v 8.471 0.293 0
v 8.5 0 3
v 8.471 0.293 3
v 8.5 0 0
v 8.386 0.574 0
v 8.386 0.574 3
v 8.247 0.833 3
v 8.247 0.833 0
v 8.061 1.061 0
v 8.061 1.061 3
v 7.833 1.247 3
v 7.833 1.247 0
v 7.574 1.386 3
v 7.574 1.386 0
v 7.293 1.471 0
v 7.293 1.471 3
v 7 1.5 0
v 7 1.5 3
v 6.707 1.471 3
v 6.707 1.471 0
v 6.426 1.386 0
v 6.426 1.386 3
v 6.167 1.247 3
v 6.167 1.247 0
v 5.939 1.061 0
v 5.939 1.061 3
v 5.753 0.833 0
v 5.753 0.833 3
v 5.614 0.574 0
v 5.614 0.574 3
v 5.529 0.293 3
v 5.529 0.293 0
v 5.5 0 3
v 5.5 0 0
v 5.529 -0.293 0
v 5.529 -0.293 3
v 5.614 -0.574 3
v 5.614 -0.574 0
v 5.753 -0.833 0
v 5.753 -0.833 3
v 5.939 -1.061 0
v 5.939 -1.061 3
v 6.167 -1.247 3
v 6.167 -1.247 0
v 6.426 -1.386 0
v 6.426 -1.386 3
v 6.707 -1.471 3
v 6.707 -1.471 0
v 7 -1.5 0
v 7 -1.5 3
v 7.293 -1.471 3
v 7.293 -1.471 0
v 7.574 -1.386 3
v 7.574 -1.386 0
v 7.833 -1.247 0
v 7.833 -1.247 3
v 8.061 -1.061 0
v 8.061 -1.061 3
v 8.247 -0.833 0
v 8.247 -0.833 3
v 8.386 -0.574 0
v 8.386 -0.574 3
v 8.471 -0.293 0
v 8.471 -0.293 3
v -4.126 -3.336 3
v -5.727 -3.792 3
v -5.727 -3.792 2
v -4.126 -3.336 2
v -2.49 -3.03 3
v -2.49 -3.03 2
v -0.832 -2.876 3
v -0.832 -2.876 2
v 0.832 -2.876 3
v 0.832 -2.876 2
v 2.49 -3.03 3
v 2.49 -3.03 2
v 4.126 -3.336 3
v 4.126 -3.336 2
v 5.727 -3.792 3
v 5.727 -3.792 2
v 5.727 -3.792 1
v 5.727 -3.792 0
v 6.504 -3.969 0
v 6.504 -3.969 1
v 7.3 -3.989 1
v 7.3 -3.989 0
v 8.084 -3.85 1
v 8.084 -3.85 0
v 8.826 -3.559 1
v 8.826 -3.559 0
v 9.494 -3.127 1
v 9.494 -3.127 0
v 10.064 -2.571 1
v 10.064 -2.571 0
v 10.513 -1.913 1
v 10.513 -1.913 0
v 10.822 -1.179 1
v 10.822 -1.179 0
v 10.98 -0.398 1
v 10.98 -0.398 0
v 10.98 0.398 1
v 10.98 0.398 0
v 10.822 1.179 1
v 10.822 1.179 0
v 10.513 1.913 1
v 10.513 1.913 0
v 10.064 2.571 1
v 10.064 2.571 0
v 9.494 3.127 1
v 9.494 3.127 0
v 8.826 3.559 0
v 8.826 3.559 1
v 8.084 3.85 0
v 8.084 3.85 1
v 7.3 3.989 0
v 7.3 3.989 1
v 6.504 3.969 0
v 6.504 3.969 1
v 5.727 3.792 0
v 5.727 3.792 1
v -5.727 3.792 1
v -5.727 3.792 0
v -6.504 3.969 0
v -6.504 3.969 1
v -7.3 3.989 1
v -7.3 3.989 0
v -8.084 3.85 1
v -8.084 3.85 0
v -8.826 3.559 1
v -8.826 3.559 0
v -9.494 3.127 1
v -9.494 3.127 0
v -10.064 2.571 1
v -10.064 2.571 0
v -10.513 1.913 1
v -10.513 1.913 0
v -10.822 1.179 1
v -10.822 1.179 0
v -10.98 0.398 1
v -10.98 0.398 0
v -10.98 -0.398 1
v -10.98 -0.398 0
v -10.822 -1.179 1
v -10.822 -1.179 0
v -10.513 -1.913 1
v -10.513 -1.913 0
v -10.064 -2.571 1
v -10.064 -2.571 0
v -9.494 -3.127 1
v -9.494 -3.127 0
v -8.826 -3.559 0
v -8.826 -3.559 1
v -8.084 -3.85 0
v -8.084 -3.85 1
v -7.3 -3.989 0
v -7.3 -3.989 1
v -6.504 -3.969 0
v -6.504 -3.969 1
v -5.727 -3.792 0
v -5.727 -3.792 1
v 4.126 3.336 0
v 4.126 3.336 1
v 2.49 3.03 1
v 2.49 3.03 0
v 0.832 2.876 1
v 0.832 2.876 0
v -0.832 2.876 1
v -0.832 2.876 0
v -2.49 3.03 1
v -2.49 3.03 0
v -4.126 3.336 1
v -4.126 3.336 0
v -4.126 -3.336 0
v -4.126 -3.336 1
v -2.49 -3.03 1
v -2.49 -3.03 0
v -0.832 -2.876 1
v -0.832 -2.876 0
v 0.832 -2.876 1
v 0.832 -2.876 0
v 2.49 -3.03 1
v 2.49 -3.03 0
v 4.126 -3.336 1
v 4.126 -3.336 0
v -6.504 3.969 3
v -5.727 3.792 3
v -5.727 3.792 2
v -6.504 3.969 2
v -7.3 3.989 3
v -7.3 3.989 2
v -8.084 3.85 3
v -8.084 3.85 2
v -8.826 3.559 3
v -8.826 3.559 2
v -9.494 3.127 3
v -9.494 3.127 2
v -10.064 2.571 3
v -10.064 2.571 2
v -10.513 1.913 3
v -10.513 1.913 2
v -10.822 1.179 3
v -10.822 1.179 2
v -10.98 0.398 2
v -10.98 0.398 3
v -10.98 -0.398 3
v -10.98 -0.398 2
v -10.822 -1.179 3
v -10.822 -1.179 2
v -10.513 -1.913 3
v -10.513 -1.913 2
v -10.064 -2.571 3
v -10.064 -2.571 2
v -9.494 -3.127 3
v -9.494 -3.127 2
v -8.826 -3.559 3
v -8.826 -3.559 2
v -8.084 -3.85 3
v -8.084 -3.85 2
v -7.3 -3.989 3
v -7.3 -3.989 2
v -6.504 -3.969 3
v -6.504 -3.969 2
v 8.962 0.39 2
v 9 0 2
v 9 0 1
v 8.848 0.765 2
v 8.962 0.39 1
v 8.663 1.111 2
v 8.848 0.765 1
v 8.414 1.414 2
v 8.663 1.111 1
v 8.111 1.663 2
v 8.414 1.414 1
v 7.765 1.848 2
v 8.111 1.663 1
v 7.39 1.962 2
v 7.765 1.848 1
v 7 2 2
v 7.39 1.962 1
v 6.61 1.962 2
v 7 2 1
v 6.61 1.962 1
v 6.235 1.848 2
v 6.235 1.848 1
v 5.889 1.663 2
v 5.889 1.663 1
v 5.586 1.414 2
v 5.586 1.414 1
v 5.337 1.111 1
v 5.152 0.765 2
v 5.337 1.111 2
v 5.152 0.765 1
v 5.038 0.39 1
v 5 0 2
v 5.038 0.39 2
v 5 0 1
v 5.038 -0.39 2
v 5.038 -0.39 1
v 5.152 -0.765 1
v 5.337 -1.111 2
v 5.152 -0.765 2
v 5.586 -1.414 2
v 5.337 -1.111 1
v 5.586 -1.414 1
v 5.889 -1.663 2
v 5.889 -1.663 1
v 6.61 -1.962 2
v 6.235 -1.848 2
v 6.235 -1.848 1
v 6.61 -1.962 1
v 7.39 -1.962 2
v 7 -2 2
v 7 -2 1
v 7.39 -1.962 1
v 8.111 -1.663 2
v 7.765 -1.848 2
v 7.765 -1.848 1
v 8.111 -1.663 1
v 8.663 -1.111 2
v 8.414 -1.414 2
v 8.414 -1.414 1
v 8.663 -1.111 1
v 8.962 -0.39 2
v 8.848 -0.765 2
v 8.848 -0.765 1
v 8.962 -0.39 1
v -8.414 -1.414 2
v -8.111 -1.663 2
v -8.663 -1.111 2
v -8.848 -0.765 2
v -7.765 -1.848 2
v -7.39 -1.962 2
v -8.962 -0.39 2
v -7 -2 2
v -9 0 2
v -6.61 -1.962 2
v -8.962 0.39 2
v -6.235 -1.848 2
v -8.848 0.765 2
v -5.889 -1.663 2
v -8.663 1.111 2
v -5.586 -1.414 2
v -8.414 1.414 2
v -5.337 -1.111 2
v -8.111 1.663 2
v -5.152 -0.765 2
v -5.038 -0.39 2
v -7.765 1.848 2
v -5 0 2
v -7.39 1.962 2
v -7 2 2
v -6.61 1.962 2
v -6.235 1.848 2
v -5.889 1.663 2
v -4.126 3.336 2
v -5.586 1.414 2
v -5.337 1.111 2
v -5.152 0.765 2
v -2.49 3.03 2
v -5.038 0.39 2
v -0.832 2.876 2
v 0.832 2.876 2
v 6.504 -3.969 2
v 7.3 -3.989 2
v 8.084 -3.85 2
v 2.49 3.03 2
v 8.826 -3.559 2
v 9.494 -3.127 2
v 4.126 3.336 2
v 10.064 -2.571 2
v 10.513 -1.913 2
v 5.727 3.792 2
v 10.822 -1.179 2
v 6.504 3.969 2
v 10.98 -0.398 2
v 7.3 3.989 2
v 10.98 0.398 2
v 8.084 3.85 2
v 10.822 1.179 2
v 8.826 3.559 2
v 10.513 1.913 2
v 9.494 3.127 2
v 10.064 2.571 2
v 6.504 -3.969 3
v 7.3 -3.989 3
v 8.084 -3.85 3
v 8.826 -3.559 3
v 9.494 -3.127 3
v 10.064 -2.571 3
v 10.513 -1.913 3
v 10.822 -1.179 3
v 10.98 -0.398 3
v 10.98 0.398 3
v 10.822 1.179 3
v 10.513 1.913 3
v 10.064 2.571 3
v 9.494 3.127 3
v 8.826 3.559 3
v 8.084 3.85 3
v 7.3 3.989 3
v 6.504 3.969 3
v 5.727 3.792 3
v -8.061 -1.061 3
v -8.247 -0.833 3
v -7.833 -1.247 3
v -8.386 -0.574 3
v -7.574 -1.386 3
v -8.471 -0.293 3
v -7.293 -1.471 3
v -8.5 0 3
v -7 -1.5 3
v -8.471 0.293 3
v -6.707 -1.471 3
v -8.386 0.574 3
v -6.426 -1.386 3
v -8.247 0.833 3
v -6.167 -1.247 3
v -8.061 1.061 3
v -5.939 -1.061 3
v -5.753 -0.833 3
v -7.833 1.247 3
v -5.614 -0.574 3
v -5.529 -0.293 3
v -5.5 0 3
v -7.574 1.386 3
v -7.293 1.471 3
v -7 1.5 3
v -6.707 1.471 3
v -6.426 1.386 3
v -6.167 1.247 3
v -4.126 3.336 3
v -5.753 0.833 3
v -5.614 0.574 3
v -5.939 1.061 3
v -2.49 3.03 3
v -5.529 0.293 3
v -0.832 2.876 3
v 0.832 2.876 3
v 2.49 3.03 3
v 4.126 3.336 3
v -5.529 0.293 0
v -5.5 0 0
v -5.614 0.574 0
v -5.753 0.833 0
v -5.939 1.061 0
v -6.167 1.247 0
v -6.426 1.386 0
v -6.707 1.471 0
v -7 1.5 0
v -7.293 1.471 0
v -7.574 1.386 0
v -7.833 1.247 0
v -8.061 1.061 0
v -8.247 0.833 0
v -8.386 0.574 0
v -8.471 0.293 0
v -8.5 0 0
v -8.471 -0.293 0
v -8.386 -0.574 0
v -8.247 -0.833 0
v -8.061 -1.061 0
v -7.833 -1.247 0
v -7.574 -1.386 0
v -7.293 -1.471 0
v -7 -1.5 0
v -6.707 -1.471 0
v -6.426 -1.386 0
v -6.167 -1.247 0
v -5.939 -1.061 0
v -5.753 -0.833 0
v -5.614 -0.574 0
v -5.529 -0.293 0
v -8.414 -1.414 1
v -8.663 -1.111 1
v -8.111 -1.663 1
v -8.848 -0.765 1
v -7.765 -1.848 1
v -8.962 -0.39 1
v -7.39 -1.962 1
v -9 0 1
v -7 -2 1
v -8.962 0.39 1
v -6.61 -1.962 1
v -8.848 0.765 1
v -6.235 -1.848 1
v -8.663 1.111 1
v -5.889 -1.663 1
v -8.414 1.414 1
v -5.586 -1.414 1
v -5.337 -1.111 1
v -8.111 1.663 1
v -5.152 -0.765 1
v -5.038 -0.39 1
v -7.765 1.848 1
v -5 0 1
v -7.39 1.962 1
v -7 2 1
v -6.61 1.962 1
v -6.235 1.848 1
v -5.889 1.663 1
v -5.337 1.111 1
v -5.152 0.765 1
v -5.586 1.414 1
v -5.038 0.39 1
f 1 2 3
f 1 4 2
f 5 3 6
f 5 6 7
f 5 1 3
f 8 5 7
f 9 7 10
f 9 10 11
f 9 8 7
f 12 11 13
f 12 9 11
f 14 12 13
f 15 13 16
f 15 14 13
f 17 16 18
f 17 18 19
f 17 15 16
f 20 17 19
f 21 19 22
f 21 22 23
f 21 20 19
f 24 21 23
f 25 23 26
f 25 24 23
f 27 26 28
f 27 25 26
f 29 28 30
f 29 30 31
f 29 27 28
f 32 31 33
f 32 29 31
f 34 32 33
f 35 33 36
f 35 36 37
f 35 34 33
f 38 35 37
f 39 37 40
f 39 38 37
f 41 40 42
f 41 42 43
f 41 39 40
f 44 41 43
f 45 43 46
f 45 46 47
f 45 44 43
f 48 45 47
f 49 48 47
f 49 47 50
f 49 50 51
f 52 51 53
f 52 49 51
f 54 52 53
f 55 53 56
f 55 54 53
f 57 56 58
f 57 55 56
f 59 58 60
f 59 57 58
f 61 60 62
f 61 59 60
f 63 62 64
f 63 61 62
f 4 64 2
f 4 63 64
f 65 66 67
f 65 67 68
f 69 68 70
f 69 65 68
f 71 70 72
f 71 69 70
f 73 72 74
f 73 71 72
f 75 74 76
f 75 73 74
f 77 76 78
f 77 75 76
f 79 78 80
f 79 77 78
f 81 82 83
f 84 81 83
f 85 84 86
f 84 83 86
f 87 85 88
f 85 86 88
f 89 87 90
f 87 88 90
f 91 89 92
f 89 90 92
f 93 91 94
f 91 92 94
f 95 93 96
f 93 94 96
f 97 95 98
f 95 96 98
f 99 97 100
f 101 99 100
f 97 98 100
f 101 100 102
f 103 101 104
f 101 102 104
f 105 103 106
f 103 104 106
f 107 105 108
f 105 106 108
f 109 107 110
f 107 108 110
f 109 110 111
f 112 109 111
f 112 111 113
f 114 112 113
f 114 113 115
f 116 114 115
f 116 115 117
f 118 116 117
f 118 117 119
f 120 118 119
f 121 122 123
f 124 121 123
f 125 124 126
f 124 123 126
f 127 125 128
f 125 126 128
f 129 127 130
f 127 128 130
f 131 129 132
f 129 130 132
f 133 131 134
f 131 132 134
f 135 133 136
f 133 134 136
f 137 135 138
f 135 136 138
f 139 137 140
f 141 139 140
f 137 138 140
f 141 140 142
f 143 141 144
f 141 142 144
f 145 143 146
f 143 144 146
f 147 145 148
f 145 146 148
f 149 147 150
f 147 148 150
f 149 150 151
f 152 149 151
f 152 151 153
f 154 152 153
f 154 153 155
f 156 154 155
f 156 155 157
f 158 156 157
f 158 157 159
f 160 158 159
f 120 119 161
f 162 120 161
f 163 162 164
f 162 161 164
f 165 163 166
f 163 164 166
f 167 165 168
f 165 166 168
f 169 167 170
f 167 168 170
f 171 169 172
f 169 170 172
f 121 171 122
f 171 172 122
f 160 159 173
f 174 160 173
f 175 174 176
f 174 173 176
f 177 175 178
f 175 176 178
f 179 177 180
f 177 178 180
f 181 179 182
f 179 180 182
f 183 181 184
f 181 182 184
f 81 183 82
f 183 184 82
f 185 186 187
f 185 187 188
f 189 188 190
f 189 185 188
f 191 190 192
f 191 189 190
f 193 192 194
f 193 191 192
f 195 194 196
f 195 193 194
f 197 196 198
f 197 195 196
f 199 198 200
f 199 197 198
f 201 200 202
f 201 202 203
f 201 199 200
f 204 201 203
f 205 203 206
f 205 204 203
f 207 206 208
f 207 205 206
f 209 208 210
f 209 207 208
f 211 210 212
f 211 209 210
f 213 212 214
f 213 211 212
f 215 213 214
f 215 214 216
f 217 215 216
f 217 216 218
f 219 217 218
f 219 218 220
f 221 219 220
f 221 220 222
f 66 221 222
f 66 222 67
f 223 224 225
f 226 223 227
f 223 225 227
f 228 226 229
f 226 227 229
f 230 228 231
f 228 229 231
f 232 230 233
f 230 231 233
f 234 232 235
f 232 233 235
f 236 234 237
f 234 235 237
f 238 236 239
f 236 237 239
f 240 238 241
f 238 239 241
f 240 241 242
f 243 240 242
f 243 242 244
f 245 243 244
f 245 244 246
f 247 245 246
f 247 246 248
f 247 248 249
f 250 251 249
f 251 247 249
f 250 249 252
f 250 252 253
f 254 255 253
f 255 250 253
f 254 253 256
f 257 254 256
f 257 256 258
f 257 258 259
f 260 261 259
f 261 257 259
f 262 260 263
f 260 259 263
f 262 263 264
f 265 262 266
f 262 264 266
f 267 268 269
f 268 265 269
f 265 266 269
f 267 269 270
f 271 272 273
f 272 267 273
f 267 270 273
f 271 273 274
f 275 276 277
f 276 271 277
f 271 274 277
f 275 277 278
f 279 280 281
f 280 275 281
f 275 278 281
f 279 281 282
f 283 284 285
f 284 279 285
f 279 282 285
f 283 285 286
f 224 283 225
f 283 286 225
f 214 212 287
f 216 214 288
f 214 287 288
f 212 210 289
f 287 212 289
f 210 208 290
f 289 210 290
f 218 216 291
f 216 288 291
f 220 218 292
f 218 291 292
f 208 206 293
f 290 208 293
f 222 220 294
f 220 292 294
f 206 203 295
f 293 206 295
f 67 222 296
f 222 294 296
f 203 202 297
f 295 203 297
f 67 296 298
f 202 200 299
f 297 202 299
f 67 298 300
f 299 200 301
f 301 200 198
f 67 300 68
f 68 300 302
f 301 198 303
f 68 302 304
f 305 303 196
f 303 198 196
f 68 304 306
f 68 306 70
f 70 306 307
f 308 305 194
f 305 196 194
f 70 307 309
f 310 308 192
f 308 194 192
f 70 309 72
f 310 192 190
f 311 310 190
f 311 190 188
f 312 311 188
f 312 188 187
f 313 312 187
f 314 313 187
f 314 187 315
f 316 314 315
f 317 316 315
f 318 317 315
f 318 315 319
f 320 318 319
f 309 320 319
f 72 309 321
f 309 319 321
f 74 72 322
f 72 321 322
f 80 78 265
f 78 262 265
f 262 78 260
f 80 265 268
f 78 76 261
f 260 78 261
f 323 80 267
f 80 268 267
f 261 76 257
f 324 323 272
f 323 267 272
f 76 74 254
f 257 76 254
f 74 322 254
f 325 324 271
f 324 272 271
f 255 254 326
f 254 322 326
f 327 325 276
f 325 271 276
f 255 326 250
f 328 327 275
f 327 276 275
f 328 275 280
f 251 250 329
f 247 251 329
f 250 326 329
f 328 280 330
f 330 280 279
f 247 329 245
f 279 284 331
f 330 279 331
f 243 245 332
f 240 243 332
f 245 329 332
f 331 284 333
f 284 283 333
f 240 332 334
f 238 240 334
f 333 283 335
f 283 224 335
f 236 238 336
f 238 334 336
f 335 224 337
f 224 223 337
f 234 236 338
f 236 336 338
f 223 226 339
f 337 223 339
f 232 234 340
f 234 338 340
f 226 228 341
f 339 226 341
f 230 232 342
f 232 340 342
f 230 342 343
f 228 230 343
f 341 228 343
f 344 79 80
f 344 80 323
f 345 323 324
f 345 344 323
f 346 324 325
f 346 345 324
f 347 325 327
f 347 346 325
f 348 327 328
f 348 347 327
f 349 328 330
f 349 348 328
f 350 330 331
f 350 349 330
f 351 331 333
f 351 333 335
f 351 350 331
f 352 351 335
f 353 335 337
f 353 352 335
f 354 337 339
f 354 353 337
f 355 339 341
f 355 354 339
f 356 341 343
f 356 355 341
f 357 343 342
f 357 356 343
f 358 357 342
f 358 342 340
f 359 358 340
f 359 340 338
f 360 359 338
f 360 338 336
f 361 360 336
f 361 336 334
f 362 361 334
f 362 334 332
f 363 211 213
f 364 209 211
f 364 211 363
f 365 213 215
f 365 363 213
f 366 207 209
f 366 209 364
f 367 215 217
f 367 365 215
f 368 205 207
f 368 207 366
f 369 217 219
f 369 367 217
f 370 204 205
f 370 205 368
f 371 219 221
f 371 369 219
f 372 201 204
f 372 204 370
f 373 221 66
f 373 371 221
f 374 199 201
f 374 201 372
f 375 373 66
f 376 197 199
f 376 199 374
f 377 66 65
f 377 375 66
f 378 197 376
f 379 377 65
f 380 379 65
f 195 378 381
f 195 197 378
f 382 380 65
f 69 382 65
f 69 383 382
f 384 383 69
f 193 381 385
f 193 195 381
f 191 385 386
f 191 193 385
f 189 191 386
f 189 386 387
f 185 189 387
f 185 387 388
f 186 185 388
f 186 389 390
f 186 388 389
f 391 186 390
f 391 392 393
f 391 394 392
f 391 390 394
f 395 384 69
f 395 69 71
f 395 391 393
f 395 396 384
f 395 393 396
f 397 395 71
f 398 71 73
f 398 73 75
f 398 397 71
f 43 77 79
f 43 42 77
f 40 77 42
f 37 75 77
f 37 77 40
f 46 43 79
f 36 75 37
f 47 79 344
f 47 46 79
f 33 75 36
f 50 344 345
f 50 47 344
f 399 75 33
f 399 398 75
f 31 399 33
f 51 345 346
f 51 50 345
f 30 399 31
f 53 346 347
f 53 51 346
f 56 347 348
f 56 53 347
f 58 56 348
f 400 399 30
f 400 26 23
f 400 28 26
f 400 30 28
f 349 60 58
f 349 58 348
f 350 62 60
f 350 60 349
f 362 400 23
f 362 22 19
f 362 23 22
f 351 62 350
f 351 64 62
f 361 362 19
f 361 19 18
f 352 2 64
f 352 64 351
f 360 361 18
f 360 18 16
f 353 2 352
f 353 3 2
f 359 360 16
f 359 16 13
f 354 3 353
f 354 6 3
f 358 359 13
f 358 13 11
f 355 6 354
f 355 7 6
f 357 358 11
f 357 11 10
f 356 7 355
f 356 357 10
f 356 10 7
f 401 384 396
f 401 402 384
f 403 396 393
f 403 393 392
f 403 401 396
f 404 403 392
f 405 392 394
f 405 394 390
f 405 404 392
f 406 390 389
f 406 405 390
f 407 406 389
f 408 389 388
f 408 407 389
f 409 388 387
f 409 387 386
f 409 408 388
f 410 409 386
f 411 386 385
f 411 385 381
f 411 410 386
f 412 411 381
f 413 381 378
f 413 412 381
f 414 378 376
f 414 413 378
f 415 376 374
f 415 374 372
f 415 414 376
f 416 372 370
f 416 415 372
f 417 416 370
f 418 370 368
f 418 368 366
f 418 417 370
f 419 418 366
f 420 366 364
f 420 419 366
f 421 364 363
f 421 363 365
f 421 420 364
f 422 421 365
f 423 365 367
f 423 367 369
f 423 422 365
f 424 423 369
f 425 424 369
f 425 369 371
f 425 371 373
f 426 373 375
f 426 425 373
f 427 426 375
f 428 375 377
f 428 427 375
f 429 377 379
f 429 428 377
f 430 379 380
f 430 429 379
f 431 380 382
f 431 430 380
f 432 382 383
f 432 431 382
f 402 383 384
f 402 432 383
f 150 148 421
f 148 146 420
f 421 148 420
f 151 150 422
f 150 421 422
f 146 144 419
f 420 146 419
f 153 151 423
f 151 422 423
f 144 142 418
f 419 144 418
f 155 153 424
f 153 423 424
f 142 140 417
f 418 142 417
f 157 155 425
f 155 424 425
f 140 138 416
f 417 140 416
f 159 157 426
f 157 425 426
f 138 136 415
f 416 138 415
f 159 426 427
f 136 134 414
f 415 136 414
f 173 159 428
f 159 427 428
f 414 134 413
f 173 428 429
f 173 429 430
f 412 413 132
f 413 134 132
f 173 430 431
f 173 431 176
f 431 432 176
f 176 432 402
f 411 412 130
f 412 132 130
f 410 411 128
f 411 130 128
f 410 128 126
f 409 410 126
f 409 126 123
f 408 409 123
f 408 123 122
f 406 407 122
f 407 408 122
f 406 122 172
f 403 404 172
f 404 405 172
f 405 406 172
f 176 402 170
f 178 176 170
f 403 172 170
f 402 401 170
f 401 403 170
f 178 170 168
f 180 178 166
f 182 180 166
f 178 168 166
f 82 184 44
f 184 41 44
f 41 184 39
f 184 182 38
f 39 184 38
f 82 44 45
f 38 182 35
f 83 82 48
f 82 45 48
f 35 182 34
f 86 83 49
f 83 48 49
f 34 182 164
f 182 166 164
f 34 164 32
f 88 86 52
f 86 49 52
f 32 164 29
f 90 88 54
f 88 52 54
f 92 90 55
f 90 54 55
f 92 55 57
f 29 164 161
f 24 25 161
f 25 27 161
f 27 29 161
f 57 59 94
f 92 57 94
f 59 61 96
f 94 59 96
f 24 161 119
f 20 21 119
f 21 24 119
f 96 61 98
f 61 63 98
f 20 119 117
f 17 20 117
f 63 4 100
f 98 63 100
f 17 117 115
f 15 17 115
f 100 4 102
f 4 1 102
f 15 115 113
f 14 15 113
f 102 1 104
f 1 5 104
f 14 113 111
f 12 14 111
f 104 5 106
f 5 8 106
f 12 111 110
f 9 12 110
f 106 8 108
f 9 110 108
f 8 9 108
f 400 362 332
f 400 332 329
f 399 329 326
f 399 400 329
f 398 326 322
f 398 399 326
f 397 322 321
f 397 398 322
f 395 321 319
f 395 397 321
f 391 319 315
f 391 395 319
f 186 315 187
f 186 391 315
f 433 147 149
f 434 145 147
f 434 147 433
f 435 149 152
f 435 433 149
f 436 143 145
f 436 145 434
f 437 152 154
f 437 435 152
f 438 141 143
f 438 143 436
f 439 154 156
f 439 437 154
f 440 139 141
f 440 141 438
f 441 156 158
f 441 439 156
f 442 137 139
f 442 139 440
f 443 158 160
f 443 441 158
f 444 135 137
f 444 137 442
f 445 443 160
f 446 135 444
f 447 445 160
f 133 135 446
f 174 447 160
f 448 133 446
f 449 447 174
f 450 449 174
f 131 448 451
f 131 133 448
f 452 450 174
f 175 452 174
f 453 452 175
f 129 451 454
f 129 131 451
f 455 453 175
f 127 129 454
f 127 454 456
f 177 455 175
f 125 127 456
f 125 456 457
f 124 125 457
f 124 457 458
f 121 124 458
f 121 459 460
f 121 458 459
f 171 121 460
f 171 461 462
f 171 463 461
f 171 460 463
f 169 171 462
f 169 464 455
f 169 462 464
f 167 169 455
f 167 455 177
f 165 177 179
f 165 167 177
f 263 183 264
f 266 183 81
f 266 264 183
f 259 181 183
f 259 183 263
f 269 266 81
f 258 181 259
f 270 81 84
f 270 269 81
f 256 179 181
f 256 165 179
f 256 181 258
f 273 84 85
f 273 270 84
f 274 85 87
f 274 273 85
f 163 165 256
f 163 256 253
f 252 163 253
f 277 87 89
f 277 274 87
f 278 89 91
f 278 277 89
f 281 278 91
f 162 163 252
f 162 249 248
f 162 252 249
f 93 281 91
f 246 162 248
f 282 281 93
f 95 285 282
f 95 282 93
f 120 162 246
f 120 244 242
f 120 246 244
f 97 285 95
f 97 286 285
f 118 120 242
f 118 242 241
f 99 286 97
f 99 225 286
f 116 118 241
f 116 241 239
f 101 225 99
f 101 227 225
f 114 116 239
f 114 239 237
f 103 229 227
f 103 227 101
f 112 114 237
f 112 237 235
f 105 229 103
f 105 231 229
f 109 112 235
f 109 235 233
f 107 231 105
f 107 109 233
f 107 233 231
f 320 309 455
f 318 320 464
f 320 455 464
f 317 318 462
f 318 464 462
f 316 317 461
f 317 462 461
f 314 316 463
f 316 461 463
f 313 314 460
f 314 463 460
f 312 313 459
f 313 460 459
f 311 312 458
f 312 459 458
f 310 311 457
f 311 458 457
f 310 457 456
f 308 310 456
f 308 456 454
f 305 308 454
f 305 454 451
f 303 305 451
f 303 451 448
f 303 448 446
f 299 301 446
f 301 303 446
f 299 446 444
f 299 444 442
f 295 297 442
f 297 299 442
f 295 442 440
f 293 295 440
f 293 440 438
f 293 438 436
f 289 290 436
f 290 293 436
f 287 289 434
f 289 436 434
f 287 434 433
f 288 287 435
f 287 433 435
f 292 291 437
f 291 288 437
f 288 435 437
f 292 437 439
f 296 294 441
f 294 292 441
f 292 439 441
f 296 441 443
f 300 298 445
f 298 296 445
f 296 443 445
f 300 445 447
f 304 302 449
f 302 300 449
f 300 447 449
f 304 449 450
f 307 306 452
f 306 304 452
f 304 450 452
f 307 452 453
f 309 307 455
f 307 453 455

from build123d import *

# Parameters (mm, degrees)
SKETCH1_R           = 1.5
BOSS_EXTRUDE1_DEPTH = 1
SKETCH2_R           = 2
SKETCH2_R_2         = 1.5
BOSS_EXTRUDE2_DEPTH = 2


with BuildPart() as part:
    # Sketch1 → Boss-Extrude1 (new body)
    with BuildSketch(Plane.XY):
        with BuildLine():
            ThreePointArc((-5.727272727, 3.792118839), (-11, 0), (-5.727272727, -3.792118839))
            ThreePointArc((-5.727272727, -3.792118839), (0, -2.856653615), (5.727272727, -3.792118839))
            ThreePointArc((5.727272727, -3.792118839), (11, 0), (5.727272727, 3.792118839))
            ThreePointArc((5.727272727, 3.792118839), (0, 2.856653615), (-5.727272727, 3.792118839))
        make_face()
        with Locations((-7, 0)):
            Circle(SKETCH1_R, mode=Mode.SUBTRACT)
        with Locations((7, 0)):
            Circle(SKETCH1_R, mode=Mode.SUBTRACT)
    boss_extrude1 = extrude(amount=BOSS_EXTRUDE1_DEPTH)

    # Sketch2 → Boss-Extrude2 (add)
    with BuildSketch(Plane.XY.offset(1)):
        with Locations((-7, 0)):
            Circle(SKETCH2_R)
        with Locations((-7, 0)):
            Circle(SKETCH2_R_2, mode=Mode.SUBTRACT)
        with Locations((7, 0)):
            Circle(SKETCH2_R)
        with Locations((7, 0)):
            Circle(SKETCH2_R_2, mode=Mode.SUBTRACT)
    extrude(amount=BOSS_EXTRUDE2_DEPTH)

    # Mirror1: Boss-Extrude1 across plane
    add(boss_extrude1.mirror(Plane.XY.offset(1.5)))


solid = part.part
